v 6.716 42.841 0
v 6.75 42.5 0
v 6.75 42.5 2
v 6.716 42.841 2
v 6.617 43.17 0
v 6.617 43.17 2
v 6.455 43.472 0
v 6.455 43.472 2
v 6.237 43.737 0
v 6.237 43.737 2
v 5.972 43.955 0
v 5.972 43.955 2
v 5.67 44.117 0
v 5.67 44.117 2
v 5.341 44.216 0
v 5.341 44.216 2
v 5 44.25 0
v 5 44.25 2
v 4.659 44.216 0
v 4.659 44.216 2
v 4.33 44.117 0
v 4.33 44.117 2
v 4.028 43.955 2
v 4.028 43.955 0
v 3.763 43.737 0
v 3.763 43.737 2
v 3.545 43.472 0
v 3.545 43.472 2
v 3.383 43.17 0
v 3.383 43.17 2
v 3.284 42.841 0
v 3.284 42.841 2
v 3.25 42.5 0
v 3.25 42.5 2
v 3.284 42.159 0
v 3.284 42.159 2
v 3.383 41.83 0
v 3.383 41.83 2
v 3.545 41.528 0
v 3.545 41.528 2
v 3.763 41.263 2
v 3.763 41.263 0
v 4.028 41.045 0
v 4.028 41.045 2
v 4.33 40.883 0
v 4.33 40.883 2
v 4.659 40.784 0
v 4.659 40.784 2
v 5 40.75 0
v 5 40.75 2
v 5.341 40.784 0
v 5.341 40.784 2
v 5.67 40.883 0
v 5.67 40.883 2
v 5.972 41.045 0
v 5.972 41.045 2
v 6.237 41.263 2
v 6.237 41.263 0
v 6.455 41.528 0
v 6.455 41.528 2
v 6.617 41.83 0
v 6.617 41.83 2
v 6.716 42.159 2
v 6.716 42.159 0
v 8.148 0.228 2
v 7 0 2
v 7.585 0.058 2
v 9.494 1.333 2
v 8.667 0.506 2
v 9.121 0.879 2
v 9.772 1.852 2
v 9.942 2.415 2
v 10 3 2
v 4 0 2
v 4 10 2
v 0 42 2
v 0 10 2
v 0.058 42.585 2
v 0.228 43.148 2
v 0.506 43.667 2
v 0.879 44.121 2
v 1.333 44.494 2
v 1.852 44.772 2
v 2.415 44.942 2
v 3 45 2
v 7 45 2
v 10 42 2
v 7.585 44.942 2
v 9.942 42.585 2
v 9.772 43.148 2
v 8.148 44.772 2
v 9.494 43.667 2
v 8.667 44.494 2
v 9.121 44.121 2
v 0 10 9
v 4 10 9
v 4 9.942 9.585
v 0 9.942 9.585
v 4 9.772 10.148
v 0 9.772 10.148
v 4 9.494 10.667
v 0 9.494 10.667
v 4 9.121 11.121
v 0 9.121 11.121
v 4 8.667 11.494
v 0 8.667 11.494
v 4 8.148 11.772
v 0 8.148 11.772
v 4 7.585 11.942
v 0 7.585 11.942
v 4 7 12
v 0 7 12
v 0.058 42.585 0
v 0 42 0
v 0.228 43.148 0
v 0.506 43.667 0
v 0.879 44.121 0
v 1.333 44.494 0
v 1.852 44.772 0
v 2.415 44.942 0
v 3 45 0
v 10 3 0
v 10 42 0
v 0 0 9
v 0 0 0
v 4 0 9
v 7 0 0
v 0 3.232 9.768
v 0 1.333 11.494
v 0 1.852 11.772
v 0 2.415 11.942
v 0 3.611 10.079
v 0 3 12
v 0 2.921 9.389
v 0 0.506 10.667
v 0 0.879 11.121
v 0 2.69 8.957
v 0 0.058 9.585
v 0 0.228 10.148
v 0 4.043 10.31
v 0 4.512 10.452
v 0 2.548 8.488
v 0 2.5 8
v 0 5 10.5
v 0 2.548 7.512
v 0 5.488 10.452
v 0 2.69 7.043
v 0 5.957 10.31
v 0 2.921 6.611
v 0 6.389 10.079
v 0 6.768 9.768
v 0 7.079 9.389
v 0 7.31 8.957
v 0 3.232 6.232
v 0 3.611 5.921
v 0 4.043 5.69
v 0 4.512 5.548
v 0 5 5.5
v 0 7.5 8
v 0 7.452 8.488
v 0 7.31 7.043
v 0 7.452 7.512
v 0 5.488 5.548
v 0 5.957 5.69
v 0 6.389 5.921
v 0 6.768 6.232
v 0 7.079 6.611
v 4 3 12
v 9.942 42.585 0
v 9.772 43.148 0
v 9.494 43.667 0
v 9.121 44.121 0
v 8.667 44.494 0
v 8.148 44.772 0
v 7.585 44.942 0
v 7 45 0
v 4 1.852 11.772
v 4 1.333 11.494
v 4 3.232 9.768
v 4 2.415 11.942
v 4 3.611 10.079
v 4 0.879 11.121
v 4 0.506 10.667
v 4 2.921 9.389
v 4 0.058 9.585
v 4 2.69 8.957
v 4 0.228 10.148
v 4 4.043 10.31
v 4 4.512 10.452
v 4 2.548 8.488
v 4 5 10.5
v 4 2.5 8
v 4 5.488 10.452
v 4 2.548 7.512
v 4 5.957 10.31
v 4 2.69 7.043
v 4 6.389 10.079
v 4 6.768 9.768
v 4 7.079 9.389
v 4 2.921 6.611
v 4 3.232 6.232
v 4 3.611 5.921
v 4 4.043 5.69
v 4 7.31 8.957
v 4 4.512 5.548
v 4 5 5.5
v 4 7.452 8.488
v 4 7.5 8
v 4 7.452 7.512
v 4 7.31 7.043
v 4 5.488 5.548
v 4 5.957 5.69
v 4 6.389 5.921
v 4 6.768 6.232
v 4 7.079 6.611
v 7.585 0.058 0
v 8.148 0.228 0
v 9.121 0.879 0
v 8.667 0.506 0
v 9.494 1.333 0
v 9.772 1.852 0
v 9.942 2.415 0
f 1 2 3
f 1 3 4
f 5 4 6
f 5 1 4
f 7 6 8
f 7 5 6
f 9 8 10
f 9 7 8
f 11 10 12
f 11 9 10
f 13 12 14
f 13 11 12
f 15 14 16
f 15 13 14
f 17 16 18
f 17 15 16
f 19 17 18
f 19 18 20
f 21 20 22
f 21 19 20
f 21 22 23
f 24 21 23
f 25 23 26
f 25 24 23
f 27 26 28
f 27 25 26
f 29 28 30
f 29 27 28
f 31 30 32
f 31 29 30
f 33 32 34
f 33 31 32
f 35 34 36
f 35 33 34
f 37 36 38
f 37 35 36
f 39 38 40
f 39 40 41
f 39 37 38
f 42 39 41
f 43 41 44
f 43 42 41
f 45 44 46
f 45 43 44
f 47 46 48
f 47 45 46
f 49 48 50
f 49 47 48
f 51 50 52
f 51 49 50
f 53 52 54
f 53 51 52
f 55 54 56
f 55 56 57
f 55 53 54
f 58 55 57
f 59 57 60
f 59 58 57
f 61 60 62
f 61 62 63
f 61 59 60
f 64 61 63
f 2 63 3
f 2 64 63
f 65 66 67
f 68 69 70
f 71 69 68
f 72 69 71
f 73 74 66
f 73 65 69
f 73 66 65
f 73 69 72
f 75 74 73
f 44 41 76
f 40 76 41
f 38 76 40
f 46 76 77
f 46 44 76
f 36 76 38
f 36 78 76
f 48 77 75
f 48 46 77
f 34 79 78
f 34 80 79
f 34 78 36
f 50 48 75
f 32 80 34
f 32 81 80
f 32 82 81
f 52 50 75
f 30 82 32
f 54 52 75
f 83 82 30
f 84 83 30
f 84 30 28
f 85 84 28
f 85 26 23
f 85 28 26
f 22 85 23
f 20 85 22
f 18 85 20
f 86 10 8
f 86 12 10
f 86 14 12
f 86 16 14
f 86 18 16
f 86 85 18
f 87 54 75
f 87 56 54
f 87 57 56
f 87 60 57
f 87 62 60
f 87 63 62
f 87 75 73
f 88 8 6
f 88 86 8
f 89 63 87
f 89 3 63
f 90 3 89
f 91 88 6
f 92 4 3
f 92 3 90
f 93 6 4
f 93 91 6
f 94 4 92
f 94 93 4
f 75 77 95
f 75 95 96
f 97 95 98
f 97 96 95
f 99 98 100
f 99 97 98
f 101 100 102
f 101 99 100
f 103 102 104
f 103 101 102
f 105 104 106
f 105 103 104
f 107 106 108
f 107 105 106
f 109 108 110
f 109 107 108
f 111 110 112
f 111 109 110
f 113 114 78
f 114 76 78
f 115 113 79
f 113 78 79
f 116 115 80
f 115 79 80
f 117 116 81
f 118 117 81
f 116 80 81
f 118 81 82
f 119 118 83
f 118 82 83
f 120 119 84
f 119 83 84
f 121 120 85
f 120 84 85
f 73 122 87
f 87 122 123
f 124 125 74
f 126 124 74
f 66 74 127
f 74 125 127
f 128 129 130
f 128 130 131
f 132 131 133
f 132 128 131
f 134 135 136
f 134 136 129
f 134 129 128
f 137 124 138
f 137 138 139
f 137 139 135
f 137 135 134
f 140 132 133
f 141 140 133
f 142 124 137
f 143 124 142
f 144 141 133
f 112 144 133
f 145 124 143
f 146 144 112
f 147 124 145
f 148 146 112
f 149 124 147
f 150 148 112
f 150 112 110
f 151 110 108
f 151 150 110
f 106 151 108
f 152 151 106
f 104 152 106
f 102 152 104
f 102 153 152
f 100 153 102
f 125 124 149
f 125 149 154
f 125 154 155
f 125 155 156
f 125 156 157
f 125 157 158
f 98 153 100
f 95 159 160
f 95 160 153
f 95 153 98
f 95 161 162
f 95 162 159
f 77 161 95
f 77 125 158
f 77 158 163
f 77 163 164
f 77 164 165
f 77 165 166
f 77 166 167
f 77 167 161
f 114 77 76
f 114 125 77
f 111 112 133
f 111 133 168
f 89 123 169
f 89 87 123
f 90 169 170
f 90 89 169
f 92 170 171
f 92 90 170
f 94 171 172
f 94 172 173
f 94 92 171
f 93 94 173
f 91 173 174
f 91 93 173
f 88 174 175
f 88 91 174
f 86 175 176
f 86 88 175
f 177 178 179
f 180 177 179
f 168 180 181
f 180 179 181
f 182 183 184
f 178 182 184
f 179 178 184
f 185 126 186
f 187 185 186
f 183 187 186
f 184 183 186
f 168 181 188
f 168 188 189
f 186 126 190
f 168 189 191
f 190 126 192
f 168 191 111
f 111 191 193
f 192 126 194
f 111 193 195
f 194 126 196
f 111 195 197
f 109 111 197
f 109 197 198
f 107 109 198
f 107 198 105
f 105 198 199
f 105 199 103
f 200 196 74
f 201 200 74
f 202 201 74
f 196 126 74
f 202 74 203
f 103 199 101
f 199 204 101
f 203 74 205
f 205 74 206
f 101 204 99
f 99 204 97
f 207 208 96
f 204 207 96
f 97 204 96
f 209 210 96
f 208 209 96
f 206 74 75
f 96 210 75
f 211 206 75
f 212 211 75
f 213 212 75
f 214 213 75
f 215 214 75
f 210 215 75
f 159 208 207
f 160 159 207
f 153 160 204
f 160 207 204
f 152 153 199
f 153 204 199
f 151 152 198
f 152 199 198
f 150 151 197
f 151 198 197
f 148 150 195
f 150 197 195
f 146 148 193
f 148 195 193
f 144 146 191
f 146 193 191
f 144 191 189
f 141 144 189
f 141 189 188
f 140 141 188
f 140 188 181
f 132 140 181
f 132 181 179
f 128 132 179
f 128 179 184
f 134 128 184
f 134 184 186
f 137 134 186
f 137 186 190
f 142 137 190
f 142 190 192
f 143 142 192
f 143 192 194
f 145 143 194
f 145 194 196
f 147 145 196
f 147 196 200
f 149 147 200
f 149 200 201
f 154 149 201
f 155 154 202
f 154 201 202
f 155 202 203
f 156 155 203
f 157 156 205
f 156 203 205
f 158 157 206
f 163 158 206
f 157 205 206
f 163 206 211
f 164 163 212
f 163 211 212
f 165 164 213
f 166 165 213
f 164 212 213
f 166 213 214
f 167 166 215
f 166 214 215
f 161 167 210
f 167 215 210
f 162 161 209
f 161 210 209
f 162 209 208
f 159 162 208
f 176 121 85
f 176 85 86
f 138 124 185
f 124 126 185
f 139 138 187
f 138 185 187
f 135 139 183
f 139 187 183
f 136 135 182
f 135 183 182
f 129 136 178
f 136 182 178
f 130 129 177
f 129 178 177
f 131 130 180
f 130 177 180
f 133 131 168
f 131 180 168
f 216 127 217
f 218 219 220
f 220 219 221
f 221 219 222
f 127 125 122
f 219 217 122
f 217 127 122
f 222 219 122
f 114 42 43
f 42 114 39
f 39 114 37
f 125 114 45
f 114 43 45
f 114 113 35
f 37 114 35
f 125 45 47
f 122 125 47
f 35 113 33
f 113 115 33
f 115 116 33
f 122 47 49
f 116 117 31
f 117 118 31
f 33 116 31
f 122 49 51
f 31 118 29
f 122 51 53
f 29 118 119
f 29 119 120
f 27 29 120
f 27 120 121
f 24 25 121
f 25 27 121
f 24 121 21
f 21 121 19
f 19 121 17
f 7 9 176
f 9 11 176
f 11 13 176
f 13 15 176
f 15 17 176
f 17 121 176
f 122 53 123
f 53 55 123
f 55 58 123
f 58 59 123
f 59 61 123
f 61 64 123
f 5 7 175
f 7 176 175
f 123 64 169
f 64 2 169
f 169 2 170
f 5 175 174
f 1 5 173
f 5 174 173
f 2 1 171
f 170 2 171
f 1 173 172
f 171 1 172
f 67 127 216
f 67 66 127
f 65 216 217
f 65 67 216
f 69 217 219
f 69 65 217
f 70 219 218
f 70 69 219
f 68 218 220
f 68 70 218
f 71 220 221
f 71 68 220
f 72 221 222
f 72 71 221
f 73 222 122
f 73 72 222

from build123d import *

# Parameters (mm, degrees)
F0_W     = 10
F0_H     = 45
F0_R     = 1.75
F1_DEPTH = 2
F2_W     = 4
F2_H     = 10
F3_DEPTH = 10
F4_R     = 3
F5_R     = 2.5
F6_DEPTH = 25.4


with BuildPart() as f1:
    # F0 (on Top) → F1 (new body)
    with BuildSketch(Plane.XY):
        with Locations((5, 22.5)):
            Rectangle(F0_W, F0_H)
        with Locations((5, 42.5)):
            Circle(F0_R, mode=Mode.SUBTRACT)
    extrude(amount=F1_DEPTH)

    # F2 (on face) → F3 (join)
    with BuildSketch(Plane.XY.offset(2)):
        with Locations((2, 5)):
            Rectangle(F2_W, F2_H)
    extrude(amount=F3_DEPTH)

    # F4
    f4_edges = [f1.edges().sort_by_distance(p)[0] for p in [
        (10, 45, 1),
        (10, 0, 1),
        (0, 45, 1),
        (2, 0, 12),
        (2, 10, 12),
    ]]
    fillet(f4_edges, radius=F4_R)

    # F5 (on face) → F6 (cut)
    with BuildSketch(Plane.YZ.offset(4)):
        with Locations((5, 8)):
            Circle(F5_R)
    extrude(amount=-F6_DEPTH, mode=Mode.SUBTRACT)


solid = f1.part
